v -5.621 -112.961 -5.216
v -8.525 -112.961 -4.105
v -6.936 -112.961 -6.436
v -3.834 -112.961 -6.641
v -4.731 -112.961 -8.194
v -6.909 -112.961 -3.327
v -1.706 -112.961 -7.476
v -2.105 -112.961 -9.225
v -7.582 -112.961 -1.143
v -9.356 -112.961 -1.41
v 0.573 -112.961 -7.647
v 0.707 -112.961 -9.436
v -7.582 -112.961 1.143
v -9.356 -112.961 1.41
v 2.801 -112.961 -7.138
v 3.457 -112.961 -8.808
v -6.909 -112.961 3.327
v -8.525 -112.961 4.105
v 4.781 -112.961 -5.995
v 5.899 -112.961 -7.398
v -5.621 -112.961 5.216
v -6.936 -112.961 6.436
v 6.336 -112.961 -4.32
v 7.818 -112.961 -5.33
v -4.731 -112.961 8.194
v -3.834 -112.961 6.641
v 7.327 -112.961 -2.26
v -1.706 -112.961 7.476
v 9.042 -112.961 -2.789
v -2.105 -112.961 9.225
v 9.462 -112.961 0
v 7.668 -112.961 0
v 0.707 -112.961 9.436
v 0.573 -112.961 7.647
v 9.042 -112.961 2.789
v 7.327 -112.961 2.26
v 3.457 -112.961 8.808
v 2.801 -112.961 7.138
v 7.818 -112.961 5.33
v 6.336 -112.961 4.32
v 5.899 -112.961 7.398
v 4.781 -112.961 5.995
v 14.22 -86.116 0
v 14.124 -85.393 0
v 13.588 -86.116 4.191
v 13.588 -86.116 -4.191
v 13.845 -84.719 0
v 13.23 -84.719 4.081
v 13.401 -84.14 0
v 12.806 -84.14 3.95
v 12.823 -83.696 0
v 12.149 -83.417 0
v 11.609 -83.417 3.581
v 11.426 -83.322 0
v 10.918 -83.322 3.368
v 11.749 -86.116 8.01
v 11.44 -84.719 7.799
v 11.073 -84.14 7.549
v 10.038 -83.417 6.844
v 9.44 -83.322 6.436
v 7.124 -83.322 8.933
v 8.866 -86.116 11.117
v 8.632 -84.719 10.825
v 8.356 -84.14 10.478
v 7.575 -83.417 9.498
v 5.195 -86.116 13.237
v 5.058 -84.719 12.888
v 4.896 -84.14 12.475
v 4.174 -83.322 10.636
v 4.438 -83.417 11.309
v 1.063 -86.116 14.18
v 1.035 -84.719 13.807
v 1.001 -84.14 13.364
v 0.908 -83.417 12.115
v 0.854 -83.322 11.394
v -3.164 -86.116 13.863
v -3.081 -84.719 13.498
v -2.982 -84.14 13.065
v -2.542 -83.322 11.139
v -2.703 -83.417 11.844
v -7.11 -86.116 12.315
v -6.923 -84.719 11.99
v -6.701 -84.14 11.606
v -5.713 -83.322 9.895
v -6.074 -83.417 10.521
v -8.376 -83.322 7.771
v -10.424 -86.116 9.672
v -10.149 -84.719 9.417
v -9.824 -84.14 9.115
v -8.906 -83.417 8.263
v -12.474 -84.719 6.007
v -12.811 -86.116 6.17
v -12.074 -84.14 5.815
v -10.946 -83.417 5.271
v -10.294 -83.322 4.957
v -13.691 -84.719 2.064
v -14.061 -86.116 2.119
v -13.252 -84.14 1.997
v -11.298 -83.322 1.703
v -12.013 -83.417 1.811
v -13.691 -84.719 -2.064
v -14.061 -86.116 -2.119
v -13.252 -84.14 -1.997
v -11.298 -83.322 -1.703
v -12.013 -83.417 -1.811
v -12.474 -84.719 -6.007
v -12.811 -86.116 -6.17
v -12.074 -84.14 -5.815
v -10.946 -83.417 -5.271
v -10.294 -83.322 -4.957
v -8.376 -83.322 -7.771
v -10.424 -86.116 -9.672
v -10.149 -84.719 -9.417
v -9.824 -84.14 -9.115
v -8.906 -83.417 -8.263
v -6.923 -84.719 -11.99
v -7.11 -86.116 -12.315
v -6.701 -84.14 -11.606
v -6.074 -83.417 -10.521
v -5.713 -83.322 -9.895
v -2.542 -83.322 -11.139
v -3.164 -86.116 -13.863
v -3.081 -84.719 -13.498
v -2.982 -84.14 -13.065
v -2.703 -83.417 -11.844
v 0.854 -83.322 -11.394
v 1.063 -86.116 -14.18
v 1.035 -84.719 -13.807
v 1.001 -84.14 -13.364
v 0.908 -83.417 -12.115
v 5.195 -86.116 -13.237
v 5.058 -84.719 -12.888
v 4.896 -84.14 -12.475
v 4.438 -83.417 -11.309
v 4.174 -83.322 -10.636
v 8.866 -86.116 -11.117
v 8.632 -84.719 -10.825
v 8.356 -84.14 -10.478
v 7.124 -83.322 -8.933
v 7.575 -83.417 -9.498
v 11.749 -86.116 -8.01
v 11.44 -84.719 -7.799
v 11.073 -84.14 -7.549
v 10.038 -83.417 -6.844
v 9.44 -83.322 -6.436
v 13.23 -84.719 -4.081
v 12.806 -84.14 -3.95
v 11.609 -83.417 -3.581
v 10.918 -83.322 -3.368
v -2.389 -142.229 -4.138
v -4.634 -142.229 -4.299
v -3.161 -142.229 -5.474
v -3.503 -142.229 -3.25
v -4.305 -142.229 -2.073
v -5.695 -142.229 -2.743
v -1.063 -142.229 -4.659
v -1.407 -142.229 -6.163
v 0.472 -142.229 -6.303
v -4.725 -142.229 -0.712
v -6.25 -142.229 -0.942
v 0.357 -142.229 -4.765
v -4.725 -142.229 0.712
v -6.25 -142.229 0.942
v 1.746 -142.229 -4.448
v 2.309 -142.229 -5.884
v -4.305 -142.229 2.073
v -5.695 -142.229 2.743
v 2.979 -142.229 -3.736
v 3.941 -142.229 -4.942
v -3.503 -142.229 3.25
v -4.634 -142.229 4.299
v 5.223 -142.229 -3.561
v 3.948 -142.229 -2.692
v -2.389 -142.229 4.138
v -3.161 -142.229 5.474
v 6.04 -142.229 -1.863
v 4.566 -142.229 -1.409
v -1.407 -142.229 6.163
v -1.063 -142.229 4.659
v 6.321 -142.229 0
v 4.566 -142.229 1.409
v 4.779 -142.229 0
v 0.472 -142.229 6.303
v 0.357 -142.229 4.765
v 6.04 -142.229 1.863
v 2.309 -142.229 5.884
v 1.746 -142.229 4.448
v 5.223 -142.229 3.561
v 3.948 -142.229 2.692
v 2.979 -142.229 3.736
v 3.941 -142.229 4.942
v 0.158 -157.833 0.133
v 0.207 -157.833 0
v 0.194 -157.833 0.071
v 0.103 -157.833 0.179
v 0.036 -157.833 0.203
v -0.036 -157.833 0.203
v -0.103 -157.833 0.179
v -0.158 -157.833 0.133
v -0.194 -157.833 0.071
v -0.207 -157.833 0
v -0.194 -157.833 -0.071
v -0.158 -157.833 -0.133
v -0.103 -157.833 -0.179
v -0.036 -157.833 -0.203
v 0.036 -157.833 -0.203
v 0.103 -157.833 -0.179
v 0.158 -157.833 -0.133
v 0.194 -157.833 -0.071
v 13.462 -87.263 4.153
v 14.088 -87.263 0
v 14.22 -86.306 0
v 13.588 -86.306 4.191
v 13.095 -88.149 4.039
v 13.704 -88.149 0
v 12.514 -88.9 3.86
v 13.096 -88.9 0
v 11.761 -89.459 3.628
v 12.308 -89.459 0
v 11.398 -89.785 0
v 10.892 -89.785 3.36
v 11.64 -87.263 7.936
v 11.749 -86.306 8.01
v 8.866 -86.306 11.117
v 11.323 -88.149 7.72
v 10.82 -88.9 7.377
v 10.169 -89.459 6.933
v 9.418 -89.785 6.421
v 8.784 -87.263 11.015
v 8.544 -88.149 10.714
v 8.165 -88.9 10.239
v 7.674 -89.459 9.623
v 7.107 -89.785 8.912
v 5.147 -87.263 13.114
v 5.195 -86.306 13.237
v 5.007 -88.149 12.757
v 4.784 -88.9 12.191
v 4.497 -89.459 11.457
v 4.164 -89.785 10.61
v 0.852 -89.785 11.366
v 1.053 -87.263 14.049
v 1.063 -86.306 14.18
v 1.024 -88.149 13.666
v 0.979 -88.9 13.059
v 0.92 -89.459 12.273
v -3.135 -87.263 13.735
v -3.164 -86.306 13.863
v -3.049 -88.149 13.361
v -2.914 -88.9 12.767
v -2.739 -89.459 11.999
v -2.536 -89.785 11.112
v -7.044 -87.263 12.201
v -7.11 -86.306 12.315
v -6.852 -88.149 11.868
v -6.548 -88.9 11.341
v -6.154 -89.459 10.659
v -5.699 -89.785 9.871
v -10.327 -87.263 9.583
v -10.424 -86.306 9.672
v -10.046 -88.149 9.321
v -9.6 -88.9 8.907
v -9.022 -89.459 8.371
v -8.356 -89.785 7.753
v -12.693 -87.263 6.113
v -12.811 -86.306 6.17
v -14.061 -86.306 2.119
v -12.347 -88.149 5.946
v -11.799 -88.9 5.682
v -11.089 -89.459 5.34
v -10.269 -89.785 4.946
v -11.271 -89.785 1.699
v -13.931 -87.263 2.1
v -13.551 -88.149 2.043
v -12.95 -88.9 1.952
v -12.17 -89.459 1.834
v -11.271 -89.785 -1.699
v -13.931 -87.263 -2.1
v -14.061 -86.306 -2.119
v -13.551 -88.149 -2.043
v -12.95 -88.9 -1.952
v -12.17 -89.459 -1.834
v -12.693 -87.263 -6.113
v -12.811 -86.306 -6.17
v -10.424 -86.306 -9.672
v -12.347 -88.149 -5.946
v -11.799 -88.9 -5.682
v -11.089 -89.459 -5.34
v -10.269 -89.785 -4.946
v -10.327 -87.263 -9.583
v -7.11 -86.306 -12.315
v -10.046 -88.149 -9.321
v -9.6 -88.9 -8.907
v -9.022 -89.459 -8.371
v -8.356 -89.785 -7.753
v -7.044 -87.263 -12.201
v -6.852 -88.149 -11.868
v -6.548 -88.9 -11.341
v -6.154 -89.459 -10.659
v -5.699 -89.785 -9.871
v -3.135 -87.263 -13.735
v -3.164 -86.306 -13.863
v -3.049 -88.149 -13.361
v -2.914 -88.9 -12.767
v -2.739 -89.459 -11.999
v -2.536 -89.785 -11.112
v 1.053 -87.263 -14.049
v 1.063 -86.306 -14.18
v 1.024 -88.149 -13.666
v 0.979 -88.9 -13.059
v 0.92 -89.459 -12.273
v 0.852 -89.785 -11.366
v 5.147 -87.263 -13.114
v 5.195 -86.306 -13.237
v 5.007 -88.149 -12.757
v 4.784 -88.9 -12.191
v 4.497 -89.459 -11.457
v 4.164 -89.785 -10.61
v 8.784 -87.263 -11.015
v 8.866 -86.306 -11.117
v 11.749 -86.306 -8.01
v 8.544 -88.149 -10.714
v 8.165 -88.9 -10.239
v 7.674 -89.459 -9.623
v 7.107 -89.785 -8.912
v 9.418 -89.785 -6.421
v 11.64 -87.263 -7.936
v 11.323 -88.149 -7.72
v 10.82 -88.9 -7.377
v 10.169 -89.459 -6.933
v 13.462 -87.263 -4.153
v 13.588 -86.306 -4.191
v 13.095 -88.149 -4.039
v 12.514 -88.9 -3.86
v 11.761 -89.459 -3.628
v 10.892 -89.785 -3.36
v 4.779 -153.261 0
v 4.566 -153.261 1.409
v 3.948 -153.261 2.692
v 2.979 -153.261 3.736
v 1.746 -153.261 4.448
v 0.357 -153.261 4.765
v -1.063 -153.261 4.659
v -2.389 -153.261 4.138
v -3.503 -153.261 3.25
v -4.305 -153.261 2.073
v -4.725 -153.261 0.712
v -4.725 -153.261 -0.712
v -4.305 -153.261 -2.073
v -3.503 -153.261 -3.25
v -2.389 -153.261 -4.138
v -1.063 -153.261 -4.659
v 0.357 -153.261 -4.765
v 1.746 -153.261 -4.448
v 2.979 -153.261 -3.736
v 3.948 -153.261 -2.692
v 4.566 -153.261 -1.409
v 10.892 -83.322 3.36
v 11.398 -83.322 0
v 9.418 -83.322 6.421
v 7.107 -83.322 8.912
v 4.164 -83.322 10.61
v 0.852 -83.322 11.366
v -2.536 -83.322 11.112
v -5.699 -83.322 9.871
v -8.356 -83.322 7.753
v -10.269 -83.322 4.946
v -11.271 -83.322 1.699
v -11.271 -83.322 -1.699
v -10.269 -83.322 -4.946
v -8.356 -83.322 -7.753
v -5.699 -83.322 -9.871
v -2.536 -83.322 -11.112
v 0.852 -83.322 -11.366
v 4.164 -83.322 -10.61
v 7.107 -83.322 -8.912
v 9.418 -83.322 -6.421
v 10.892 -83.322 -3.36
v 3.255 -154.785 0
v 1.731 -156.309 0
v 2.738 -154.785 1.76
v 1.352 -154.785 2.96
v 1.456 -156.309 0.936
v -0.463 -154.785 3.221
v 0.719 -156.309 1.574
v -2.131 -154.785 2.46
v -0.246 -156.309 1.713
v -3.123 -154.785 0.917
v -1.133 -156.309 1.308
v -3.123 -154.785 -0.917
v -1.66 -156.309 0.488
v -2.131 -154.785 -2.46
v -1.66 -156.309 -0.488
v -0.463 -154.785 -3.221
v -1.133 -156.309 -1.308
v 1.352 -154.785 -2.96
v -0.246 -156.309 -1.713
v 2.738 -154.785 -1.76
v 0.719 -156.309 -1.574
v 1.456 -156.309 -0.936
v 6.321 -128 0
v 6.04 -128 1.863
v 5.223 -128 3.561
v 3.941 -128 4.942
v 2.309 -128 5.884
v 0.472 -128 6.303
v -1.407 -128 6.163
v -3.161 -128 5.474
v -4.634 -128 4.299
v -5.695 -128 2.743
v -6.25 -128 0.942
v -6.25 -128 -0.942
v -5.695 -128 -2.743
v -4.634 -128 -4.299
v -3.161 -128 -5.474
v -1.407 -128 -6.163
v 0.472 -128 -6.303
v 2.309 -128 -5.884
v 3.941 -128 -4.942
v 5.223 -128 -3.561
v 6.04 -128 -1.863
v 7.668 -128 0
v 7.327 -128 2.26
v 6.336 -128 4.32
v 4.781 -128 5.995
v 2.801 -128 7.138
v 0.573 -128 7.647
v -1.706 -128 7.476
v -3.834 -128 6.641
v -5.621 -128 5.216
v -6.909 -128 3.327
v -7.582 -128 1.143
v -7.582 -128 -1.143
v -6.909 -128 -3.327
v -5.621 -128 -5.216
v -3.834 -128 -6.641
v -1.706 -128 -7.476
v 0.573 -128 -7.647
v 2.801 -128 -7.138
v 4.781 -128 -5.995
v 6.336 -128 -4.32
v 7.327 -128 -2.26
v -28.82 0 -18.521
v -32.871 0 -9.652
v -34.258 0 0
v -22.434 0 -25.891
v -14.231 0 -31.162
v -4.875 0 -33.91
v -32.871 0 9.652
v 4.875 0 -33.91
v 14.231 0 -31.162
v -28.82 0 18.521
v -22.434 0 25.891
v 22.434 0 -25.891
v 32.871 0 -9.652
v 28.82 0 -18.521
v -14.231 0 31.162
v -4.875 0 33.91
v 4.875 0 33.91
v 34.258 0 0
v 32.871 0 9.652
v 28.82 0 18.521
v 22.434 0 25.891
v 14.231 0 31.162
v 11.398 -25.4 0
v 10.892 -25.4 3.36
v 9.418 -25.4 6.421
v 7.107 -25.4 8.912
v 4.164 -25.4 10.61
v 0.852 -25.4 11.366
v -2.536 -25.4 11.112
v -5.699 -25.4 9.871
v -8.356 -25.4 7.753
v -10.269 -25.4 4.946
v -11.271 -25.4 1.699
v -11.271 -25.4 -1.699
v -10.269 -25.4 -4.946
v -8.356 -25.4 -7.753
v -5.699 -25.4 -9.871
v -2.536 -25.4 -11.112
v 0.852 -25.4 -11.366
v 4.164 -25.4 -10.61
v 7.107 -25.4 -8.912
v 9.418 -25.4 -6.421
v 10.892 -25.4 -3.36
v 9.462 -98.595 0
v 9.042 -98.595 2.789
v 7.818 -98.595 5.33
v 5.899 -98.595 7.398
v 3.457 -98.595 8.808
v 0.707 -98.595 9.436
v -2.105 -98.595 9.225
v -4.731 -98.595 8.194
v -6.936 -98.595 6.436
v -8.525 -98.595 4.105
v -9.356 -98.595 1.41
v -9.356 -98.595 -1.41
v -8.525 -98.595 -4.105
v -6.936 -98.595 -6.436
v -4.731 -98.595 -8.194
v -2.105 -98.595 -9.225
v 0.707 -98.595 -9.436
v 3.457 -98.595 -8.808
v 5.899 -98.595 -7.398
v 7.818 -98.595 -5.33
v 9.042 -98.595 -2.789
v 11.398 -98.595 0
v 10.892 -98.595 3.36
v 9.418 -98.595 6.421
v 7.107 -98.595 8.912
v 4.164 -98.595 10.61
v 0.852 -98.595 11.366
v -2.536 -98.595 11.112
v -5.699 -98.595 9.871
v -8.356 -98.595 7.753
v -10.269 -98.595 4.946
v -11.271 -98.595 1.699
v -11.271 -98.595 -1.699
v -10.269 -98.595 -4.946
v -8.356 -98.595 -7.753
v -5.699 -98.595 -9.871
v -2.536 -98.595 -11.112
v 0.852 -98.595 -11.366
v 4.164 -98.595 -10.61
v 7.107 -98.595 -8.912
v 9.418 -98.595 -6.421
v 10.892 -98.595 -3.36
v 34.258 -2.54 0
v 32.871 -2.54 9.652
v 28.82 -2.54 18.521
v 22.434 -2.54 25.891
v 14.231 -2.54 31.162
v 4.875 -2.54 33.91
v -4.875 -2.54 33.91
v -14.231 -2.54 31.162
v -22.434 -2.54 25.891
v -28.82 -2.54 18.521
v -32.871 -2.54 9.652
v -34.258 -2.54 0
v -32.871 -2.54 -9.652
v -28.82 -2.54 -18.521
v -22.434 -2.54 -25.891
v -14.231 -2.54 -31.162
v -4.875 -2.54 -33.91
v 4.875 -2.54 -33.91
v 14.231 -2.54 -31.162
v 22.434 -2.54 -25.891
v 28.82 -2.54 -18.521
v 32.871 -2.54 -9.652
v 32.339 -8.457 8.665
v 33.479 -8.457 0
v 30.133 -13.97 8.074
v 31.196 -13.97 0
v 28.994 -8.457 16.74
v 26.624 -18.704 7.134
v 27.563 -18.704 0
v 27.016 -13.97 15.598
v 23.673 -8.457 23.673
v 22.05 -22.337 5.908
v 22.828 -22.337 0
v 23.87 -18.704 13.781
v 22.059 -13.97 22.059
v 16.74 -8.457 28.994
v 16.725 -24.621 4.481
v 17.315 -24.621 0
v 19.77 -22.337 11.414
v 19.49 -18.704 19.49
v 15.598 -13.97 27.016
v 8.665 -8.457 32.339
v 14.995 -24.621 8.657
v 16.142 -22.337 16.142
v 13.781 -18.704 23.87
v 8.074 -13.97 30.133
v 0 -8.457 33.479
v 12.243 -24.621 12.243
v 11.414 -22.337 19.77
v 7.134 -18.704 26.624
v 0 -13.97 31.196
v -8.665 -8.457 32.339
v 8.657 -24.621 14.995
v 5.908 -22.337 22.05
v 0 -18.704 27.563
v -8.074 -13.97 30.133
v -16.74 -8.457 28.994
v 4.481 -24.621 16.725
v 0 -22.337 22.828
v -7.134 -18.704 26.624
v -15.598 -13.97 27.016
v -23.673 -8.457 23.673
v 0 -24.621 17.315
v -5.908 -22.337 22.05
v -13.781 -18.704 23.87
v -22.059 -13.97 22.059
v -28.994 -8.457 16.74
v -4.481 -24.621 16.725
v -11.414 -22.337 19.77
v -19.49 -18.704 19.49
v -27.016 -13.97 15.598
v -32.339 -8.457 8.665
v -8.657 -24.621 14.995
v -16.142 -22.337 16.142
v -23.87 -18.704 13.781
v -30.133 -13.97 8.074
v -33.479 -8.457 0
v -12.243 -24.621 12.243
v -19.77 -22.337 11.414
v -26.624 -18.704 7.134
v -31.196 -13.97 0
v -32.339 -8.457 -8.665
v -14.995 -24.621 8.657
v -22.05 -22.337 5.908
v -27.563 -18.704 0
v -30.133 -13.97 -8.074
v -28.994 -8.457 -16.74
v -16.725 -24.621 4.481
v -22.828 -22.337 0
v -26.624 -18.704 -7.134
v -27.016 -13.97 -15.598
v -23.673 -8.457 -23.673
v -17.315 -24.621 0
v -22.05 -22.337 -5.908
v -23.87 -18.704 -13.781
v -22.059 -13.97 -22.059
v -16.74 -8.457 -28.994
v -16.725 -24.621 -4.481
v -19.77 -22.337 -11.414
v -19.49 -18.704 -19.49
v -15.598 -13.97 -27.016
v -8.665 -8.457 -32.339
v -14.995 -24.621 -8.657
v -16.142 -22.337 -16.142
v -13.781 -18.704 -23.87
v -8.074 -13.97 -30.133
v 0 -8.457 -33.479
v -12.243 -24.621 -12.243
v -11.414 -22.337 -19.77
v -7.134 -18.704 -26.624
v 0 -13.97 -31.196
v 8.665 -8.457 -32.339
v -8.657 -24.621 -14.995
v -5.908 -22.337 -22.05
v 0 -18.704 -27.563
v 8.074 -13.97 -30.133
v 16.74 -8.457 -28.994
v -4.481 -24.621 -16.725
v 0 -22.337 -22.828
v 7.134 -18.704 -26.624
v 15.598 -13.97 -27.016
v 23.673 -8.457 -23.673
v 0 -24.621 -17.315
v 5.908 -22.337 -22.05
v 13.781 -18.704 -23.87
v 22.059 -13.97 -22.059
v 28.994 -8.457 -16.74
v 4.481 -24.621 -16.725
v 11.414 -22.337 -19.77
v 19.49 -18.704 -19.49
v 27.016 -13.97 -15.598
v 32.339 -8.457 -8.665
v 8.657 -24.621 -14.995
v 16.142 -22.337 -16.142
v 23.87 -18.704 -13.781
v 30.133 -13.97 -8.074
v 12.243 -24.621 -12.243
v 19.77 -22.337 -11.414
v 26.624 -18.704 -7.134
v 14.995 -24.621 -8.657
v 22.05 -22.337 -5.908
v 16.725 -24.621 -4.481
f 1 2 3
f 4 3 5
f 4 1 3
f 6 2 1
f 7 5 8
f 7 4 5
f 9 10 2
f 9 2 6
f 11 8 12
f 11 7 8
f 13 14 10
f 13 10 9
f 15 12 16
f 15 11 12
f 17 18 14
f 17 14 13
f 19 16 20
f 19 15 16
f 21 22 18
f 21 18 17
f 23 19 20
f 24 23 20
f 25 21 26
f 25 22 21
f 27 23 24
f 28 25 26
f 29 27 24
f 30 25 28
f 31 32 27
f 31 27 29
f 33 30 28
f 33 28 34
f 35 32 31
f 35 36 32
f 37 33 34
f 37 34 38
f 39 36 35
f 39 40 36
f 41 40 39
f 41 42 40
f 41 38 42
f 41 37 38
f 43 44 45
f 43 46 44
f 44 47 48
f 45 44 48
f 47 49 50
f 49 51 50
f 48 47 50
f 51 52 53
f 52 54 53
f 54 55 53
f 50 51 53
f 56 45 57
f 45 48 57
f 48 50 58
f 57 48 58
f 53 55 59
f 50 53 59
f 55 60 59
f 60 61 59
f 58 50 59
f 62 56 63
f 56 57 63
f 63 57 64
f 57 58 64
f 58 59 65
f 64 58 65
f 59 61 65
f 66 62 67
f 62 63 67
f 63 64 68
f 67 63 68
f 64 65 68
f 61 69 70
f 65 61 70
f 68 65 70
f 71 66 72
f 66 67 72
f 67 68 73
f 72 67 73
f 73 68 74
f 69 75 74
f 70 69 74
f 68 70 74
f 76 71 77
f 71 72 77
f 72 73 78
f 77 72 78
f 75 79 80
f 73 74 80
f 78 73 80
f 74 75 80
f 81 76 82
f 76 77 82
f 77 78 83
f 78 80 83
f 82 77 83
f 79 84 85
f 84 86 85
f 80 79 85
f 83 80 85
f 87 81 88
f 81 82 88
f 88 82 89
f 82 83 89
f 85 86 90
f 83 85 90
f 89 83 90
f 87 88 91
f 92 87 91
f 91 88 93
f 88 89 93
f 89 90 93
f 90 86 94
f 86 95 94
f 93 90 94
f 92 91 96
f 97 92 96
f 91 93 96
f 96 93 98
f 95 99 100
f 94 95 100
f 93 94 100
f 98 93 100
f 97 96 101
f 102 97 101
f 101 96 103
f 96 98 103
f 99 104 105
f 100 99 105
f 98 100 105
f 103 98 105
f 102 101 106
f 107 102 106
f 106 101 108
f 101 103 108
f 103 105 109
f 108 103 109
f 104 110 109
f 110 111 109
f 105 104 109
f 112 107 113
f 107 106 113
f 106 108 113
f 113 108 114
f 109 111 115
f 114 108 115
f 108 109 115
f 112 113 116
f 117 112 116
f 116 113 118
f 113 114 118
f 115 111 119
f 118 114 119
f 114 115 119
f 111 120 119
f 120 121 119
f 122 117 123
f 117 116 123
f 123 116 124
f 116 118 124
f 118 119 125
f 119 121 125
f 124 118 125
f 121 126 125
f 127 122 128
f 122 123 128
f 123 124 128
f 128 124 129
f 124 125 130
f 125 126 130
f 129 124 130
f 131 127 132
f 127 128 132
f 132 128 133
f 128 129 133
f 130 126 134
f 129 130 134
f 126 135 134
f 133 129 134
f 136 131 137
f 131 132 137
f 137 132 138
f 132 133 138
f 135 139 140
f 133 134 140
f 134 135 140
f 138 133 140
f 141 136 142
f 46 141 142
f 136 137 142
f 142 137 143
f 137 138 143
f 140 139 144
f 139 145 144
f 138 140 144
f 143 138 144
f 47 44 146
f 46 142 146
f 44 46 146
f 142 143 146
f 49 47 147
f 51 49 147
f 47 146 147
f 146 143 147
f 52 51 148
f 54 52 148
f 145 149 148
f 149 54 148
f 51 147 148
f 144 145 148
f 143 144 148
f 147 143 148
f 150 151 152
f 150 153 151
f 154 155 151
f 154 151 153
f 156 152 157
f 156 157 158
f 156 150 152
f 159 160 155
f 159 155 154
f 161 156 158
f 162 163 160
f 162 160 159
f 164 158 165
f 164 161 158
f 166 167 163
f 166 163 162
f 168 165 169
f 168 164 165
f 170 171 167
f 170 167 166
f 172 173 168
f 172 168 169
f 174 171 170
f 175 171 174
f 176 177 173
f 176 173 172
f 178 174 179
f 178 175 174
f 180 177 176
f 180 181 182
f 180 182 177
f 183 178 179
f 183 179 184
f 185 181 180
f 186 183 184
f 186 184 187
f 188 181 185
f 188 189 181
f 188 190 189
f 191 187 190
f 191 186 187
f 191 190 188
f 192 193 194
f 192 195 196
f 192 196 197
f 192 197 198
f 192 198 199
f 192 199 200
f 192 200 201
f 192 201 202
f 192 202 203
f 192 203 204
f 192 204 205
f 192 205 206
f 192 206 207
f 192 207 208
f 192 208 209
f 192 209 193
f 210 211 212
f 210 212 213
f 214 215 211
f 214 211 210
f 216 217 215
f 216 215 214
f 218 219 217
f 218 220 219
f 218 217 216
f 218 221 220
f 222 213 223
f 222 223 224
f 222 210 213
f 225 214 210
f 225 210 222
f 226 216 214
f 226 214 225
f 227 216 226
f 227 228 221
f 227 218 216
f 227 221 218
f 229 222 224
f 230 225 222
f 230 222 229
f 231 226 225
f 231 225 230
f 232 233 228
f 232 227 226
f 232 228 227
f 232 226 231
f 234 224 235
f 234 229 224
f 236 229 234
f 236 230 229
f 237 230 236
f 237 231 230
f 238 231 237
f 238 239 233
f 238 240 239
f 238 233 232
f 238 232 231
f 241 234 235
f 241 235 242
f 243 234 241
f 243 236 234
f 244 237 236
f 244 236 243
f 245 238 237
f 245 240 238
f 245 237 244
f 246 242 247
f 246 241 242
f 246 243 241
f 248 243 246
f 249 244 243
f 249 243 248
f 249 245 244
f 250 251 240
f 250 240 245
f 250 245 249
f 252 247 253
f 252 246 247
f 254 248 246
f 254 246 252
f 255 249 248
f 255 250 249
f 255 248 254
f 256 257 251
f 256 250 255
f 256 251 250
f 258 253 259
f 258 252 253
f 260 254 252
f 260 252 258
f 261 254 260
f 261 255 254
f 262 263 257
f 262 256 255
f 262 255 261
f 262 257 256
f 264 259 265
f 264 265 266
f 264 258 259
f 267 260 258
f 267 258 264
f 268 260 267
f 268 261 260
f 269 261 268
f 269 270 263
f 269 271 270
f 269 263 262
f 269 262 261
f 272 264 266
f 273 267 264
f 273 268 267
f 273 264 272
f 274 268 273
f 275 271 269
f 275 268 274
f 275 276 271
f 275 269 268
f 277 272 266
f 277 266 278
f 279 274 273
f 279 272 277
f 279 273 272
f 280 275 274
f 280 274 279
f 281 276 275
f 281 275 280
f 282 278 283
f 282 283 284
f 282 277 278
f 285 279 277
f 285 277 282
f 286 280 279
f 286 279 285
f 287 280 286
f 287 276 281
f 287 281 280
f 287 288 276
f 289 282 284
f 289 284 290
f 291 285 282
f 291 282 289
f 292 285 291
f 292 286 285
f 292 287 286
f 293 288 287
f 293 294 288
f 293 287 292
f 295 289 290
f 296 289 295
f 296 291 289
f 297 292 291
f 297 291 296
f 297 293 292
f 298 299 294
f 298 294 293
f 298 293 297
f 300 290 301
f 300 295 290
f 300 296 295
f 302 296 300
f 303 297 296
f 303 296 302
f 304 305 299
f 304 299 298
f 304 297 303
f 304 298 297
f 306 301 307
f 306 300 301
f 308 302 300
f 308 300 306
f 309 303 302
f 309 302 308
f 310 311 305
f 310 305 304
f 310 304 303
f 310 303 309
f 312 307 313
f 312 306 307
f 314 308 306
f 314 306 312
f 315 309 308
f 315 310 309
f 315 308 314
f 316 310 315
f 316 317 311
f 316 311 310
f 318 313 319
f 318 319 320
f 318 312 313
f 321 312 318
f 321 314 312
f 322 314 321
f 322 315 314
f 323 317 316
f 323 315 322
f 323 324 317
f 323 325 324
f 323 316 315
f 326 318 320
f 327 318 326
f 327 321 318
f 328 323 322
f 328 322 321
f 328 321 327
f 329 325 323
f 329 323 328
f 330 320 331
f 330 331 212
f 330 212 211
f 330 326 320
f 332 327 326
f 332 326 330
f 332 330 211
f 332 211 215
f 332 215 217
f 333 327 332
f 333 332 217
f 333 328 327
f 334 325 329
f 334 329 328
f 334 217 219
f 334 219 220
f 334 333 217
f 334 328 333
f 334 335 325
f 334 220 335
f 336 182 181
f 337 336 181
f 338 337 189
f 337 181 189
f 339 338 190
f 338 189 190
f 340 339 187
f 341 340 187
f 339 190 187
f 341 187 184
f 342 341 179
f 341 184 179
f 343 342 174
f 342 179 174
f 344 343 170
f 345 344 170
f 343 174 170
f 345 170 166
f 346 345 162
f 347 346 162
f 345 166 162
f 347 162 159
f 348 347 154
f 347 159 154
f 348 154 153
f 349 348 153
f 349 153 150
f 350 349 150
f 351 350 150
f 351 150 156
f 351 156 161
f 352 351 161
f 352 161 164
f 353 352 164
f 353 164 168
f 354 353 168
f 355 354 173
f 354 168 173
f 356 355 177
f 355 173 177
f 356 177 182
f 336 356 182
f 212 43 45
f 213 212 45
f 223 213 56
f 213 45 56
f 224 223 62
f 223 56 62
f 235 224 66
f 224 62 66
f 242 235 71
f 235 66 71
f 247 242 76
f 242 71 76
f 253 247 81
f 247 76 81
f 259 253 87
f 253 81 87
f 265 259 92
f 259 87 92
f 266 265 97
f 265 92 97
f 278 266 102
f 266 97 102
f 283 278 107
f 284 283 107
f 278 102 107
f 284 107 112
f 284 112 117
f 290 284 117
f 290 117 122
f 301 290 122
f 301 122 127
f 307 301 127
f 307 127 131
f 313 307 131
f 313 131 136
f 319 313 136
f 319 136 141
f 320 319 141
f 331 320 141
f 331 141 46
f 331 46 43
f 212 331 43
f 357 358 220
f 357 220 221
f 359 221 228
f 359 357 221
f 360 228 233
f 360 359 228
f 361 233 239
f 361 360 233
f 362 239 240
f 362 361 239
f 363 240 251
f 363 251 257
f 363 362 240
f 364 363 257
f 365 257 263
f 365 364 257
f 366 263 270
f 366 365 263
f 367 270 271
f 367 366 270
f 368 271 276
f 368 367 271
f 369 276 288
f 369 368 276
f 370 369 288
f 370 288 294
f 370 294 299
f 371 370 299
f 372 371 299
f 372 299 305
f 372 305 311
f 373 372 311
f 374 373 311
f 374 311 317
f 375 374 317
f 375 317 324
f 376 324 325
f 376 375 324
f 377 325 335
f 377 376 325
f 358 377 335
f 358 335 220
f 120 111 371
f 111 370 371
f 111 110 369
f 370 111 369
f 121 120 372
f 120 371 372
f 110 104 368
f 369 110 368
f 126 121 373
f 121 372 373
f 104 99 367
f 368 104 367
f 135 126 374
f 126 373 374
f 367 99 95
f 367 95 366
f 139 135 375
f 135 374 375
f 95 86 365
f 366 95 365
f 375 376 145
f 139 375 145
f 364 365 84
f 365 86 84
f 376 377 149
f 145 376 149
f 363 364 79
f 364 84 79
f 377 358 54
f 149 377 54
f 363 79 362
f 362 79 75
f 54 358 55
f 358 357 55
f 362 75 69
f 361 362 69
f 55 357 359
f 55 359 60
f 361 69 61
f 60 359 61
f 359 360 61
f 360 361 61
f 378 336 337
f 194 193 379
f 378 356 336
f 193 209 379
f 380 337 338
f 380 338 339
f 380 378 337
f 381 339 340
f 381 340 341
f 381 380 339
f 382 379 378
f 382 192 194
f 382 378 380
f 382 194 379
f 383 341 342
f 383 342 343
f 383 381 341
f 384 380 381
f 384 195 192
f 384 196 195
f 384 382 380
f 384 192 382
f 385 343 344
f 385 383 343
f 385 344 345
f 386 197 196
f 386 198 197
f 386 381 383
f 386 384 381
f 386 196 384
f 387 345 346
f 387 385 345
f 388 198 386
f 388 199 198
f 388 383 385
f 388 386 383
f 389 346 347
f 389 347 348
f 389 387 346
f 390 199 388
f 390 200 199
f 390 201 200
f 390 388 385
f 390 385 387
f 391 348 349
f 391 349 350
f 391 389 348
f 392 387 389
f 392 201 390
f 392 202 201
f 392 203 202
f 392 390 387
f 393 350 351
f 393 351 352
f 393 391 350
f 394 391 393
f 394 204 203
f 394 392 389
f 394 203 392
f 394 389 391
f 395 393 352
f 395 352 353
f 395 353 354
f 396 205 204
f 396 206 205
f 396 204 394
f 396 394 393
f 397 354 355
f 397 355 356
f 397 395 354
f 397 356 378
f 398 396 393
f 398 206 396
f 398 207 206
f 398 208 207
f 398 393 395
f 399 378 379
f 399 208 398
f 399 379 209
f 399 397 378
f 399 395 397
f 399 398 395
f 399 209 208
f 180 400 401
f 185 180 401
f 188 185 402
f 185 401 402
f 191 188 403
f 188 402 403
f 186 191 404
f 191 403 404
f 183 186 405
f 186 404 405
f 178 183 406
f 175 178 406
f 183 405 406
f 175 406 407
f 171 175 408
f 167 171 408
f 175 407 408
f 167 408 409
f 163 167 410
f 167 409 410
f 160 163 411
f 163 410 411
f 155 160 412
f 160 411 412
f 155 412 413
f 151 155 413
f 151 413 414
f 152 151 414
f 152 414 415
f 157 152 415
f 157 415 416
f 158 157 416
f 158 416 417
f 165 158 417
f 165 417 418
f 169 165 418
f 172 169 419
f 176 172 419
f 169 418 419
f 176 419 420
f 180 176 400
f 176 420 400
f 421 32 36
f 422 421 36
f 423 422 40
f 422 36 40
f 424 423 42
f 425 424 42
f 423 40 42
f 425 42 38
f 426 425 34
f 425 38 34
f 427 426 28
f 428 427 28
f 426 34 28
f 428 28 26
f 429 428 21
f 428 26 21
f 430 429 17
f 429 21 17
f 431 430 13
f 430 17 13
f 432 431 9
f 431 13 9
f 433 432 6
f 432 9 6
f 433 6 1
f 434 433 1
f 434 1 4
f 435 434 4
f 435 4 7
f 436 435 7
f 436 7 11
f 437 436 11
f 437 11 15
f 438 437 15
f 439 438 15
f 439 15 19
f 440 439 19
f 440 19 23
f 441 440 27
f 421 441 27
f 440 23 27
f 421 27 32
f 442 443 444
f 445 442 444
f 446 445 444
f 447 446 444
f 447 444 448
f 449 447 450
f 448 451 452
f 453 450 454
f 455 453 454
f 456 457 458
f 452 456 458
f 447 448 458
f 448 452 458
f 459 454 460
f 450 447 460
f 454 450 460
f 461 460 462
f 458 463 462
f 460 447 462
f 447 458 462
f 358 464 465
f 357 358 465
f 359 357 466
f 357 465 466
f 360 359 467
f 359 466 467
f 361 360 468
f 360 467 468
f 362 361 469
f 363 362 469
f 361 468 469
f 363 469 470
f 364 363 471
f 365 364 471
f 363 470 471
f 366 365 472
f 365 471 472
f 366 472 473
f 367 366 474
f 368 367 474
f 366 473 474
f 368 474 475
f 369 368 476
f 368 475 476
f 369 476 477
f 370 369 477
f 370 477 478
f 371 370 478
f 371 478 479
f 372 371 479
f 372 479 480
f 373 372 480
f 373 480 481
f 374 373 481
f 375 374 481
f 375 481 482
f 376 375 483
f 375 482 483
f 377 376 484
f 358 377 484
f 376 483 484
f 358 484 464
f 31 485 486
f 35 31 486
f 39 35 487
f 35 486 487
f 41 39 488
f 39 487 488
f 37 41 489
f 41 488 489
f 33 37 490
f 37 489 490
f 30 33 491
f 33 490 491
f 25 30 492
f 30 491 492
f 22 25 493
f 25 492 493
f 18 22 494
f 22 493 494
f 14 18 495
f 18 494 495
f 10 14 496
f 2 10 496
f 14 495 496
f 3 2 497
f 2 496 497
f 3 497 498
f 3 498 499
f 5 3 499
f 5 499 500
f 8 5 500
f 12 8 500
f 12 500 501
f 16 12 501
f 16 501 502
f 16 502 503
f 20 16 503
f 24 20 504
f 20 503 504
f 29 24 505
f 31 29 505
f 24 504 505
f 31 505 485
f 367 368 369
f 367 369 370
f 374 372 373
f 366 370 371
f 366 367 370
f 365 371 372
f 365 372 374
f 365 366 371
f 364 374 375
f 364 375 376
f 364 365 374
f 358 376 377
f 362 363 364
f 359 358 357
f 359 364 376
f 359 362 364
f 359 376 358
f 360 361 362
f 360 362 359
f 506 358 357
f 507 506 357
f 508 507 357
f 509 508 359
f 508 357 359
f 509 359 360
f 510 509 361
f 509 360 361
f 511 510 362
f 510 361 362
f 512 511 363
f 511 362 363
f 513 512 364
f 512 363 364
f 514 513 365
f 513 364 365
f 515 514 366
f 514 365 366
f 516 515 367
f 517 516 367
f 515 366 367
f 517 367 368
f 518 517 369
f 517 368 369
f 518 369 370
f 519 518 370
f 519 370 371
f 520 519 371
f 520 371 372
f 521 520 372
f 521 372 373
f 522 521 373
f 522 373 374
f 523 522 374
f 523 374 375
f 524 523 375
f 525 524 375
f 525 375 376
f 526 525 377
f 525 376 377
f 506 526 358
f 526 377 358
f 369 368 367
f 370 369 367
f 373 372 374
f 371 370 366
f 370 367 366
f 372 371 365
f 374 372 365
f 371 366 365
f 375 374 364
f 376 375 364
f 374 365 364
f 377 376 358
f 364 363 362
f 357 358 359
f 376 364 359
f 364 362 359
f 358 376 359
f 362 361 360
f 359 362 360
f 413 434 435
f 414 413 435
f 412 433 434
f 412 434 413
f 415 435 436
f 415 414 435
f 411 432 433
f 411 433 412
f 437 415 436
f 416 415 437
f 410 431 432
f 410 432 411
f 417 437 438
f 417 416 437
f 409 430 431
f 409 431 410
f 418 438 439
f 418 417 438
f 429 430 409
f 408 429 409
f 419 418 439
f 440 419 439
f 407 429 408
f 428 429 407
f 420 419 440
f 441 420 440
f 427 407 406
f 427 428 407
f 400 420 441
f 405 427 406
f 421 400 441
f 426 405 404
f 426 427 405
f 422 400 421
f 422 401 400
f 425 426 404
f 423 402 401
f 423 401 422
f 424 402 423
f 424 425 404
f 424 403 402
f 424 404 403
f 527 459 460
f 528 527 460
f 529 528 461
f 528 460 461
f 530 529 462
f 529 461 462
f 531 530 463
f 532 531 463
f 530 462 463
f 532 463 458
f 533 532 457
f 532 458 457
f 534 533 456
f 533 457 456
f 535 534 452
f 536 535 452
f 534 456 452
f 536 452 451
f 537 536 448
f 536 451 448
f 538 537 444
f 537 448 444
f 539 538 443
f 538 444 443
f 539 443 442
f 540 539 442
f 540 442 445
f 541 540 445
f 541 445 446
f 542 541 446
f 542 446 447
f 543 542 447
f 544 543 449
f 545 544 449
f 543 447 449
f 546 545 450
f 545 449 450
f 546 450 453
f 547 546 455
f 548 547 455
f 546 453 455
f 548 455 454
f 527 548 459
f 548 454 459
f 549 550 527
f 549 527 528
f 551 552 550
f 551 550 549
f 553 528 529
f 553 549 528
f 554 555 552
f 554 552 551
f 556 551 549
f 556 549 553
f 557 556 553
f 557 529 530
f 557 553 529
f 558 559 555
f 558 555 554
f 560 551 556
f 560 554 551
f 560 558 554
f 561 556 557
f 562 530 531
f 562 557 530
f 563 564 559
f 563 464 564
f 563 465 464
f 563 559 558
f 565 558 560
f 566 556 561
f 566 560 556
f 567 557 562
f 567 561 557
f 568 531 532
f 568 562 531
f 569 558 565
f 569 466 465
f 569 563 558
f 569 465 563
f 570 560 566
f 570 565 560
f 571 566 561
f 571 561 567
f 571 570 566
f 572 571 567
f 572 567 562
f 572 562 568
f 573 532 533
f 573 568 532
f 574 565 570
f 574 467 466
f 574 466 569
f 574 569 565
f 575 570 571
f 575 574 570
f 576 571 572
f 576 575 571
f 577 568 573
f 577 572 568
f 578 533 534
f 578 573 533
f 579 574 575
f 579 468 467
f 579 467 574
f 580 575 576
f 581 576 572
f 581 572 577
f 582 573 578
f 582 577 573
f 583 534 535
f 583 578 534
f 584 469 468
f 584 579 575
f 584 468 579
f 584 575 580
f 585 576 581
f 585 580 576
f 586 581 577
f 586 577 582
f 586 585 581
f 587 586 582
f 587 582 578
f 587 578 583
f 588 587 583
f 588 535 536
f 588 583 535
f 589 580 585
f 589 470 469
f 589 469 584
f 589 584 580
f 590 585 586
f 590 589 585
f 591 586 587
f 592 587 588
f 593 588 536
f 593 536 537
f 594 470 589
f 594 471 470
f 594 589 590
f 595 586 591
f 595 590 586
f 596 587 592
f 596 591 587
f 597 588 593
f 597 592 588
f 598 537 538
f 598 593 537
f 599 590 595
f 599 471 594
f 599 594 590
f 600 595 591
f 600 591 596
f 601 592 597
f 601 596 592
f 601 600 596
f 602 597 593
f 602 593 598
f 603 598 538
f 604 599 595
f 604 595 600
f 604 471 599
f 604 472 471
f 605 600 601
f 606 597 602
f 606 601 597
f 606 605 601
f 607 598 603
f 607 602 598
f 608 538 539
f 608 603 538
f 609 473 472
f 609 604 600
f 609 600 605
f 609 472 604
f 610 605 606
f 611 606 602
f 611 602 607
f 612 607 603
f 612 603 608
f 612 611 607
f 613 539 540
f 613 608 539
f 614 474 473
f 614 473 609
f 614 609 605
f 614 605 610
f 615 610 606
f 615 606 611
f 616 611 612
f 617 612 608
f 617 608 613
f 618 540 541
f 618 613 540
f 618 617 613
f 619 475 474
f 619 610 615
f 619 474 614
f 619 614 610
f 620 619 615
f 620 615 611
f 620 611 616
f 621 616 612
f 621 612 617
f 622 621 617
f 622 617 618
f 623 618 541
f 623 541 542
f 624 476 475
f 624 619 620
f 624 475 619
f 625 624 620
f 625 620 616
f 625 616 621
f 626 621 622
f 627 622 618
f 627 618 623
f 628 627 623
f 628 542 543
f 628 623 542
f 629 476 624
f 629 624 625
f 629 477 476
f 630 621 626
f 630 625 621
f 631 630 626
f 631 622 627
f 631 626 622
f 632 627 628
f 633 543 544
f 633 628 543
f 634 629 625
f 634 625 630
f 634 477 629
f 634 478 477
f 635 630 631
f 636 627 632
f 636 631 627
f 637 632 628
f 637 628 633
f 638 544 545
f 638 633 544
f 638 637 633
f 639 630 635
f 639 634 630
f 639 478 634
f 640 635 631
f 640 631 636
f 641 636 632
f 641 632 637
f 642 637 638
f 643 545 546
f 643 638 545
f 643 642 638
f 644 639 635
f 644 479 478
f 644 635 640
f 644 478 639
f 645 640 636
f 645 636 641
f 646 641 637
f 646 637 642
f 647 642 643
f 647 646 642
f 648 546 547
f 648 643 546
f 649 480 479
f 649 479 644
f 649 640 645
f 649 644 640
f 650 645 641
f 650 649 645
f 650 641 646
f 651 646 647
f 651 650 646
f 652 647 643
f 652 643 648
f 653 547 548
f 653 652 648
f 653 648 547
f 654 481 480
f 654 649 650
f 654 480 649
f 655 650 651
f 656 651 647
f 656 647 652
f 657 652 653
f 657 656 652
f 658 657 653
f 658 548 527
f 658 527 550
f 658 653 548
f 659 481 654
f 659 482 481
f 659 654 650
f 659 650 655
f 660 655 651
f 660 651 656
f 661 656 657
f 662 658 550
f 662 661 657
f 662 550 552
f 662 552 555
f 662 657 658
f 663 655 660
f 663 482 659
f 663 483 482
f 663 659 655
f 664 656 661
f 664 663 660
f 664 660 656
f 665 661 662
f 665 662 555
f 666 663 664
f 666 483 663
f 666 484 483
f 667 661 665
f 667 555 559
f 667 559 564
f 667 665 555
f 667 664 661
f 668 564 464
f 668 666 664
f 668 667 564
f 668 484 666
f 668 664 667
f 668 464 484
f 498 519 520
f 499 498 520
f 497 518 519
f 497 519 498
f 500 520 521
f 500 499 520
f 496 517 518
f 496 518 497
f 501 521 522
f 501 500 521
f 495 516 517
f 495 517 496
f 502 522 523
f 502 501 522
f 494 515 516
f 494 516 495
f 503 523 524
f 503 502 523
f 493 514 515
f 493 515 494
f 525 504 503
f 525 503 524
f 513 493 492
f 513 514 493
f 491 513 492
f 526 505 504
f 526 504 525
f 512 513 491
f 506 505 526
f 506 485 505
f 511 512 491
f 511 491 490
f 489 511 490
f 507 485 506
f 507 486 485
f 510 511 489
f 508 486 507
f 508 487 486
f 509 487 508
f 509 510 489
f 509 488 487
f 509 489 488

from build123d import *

# Parameters (mm, degrees)
F0_R      = 34.2582763281
F1_DEPTH  = 25.4
F2_R      = 22.86
F3_DEPTH  = 57.9221248627
F4_R      = 14.2196111498
F4_R_2    = 11.3982763281
F5_DEPTH  = 6.4626615494
F7_R      = 2.794
F8_DEPTH  = 15.2733121067
F9_R      = 9.4619725581
F10_DEPTH = 14.3653638661
F11_R     = 7.6680324081
F12_DEPTH = 15.0388088077
F13_R     = 6.3210744691
F14_DEPTH = 14.2291132361
F15_R     = 4.7785740108
F16_DEPTH = 15.6039167196
F17_SIZE  = 4.572


# Not quite as in the source:
# - a fillet or chamfer that OpenCascade refuses, or shapes differently, is made with other operations: its cross-section is extruded or revolved along the edge and cut away or added


with BuildPart() as f1:
    # F0 (on Front) → F1 (new body)
    with BuildSketch(Plane.XZ):
        Circle(F0_R)
    extrude(amount=F1_DEPTH)

    # F2
    f2_edges = [f1.edges().sort_by_distance(p)[0] for p in [
        (-34.258276, -25.4, 0),
    ]]
    fillet(f2_edges, radius=F2_R)

    # F3 (add): a face of the model
    f3_faces = [f1.faces().sort_by_distance(p)[0] for p in [
        (0, -25.4, 0),
    ]]
    extrude(f3_faces, amount=F3_DEPTH)


with BuildPart() as f5:
    # F4 (on face) → F5 (new body)
    with BuildSketch(Plane.XZ.offset(83.3221248627)):
        Circle(F4_R)
        Circle(F4_R_2, mode=Mode.SUBTRACT)
    extrude(amount=F5_DEPTH)

    # F6: fillet of radius 3.556 on 1 edges, made by hand

    # F6_s1 → F6_t2 (revolve, cut)
    with BuildSketch(Plane.XY):
        with BuildLine():
            ThreePointArc((14.2196111498, -86.3055044351), (13.4256398765, -88.5452216746), (11.3982763281, -89.7847864121))
            Line((11.3982763281, -89.7847864121), (14.2196111498, -89.7847864121))
            Line((14.2196111498, -89.7847864121), (14.2196111498, -86.3055044351))
        make_face()
    revolve(axis=Axis((0, -89.7847864121, 0), (0, -1, 0)), mode=Mode.SUBTRACT)

    # F7
    f7_edges = [f5.edges().sort_by_distance(p)[0] for p in [
        (-14.219611, -83.322125, 0),
    ]]
    fillet(f7_edges, radius=F7_R)


with BuildPart() as f8:
    # F8 (new): a face of the model
    f8_faces = [f1.part.faces().sort_by_distance(p)[0] for p in [
        (0, -83.3221248627, 0),
    ]]
    extrude(f8_faces, amount=F8_DEPTH)

    # F9 (on face) → F10 (join)
    with BuildSketch(Plane.XZ.offset(98.5954369694)):
        Circle(F9_R)
    extrude(amount=F10_DEPTH)

    # F11 (on face) → F12 (join)
    with BuildSketch(Plane.XZ.offset(112.9608008355)):
        Circle(F11_R)
    extrude(amount=F12_DEPTH)

    # F13 (on face) → F14 (join)
    with BuildSketch(Plane.XZ.offset(127.9996096432)):
        Circle(F13_R)
    extrude(amount=F14_DEPTH)

    # F15 (on face) → F16 (join)
    with BuildSketch(Plane.XZ.offset(142.2287228793)):
        Circle(F15_R)
    extrude(amount=F16_DEPTH)

    # F17
    f17_edges = [f8.edges().sort_by_distance(p)[0] for p in [
        (-4.778574, -157.83264, 0),
    ]]
    chamfer(f17_edges, length=F17_SIZE)


solid = Compound([f1.part, f5.part, f8.part])
